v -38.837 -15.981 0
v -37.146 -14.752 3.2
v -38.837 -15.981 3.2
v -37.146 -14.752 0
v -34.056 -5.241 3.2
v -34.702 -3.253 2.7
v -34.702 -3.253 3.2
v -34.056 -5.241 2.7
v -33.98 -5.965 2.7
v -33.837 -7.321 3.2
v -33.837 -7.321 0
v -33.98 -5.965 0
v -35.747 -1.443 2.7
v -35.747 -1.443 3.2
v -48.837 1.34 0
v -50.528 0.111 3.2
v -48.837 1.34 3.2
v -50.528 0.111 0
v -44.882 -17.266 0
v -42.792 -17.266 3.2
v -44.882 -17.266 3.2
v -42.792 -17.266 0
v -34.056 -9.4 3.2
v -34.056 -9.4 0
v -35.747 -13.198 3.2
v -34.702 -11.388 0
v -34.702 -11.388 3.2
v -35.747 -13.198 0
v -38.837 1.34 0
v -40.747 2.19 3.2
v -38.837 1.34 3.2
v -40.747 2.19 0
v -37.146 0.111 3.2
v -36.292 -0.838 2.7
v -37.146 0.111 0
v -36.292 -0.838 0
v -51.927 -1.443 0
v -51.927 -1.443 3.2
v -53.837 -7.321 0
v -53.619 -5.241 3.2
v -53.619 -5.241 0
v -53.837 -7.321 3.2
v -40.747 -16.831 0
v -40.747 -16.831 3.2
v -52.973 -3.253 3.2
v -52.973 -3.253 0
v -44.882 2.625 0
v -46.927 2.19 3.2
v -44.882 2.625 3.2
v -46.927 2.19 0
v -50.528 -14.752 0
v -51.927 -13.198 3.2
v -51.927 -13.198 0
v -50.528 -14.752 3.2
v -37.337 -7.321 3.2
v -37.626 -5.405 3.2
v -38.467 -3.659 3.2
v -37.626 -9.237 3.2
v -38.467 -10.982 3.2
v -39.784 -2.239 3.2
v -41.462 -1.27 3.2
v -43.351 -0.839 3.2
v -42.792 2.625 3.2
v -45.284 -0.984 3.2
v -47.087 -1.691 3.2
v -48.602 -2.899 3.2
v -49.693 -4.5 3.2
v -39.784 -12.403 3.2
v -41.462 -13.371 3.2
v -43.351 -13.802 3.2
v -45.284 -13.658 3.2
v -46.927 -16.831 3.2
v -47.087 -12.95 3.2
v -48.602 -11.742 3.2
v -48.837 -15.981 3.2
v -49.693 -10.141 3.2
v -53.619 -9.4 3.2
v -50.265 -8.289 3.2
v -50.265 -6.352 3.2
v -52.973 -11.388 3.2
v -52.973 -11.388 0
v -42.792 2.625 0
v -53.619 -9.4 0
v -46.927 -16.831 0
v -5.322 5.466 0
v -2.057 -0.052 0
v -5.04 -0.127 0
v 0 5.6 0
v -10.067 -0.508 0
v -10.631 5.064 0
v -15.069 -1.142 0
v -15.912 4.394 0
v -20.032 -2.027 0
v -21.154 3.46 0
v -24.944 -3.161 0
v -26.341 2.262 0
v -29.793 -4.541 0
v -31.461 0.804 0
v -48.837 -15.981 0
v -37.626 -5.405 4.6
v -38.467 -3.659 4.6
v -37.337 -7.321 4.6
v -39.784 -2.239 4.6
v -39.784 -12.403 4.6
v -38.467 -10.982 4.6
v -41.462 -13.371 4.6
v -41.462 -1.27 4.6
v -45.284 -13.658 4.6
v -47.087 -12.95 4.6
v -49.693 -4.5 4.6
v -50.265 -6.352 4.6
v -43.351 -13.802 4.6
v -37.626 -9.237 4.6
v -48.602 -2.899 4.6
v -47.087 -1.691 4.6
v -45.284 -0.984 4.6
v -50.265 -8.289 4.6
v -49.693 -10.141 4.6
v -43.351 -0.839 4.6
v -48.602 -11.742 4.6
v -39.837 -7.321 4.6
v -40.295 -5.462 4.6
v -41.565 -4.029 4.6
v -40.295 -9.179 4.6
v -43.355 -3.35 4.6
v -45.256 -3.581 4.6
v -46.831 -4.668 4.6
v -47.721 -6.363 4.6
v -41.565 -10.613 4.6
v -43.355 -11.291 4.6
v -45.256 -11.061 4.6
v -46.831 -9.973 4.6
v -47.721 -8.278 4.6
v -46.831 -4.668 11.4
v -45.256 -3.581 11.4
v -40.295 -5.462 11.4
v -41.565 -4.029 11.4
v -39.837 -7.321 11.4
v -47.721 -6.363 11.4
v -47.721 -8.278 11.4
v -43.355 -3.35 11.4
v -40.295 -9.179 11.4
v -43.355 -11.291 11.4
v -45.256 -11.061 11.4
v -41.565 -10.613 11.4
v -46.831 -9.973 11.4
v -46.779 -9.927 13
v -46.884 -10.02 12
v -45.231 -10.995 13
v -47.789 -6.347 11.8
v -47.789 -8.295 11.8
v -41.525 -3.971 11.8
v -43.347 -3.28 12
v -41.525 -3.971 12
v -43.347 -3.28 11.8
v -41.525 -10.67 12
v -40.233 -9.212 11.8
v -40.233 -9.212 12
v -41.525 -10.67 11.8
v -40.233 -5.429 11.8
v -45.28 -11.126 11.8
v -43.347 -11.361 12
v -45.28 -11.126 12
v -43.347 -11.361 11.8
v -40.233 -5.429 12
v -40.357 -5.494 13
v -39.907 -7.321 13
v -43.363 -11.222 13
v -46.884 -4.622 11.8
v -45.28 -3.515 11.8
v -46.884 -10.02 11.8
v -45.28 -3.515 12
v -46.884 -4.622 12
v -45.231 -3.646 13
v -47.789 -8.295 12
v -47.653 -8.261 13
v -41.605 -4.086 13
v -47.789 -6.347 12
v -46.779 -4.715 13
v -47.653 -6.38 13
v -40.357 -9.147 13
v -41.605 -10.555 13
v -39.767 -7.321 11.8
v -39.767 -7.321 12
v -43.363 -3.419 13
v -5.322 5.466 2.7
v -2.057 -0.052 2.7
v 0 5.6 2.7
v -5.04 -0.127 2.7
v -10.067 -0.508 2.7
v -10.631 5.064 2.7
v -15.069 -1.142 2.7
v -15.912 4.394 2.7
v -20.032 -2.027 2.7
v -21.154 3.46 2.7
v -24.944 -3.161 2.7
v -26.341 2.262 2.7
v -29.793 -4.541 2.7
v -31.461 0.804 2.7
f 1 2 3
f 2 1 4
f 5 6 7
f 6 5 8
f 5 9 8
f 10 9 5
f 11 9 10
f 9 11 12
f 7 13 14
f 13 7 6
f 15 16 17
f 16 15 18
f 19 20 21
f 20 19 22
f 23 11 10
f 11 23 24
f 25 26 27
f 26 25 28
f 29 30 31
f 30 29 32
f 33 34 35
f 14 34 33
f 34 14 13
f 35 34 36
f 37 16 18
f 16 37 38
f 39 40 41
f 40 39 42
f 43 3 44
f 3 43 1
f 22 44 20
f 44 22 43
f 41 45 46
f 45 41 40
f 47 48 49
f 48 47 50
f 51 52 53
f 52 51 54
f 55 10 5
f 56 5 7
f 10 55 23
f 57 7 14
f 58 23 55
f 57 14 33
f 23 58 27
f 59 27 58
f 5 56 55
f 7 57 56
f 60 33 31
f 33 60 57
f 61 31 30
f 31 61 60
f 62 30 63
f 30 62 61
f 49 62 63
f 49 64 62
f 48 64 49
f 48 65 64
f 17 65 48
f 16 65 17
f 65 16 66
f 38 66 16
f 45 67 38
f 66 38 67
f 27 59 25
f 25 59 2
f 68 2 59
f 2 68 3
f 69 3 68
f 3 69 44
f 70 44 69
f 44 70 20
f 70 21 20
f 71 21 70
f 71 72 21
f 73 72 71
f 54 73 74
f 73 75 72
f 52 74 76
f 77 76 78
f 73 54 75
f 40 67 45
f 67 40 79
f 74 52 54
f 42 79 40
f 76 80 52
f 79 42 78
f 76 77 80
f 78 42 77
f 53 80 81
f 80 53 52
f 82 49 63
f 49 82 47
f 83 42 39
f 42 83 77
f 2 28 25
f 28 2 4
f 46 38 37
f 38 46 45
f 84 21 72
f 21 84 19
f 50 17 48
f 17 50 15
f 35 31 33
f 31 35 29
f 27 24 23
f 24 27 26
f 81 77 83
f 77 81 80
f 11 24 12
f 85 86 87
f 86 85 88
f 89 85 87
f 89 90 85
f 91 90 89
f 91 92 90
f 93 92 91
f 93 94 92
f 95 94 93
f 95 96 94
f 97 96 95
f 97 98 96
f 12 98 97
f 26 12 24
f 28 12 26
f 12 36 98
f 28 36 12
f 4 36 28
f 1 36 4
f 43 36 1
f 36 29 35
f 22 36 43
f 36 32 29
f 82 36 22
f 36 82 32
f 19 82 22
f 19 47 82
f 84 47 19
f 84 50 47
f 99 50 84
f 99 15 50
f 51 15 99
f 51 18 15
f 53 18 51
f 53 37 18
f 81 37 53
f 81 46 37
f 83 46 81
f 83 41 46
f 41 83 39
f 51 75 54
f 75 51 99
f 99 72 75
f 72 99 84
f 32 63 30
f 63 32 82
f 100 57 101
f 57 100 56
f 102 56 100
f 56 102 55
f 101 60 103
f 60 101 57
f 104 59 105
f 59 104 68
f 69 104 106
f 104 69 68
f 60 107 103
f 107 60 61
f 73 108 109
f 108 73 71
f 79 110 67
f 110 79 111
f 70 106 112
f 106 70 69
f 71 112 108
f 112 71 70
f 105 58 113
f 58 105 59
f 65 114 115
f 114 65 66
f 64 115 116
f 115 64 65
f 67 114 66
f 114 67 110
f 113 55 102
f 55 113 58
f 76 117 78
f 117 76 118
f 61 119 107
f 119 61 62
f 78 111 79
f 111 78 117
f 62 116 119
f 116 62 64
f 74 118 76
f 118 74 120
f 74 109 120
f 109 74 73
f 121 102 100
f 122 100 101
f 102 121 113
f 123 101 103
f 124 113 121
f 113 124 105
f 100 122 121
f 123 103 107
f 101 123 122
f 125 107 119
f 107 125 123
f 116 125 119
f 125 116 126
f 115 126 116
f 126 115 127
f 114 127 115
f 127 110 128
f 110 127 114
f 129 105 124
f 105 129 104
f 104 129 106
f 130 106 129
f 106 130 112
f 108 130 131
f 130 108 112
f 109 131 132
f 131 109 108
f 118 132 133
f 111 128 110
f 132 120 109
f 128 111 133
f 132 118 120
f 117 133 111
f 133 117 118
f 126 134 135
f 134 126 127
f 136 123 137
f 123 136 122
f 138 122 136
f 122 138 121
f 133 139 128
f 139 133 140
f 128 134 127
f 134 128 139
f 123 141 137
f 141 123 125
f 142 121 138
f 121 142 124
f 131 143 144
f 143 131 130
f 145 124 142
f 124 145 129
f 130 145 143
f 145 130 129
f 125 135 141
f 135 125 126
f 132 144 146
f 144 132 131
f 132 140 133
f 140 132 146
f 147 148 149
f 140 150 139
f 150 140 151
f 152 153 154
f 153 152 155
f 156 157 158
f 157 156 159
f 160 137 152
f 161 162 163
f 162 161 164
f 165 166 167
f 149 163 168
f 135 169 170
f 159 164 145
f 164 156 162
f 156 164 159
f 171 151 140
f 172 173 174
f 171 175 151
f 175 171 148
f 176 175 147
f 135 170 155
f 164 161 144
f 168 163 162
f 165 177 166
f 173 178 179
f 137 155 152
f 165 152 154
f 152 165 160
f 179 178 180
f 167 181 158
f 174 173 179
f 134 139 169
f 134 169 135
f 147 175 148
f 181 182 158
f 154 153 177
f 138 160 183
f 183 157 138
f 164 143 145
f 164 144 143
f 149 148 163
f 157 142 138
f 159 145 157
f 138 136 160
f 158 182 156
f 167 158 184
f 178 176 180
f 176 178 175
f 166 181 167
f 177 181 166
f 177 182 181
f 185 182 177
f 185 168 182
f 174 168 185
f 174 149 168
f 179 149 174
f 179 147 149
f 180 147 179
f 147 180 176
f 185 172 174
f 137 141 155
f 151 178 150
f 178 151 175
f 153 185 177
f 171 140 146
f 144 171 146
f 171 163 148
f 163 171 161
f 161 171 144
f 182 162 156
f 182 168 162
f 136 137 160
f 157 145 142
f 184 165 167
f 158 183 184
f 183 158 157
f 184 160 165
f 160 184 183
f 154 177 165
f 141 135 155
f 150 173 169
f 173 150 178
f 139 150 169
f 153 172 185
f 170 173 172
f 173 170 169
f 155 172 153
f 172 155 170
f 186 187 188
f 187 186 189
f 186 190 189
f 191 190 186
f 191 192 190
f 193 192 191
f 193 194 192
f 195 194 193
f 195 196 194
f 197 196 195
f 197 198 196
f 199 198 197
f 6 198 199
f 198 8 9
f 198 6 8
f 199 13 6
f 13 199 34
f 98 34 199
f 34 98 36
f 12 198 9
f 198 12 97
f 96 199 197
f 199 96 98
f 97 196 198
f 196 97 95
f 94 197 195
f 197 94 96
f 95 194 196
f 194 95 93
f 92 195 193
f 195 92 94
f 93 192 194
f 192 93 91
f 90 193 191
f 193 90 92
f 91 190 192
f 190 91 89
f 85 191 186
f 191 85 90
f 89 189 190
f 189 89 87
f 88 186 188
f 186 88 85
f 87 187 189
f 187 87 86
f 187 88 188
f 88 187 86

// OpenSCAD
/*
 * CR-10S Pro wheel guide for filament: bended arm with wheel support part
 *
 * History
 * -------
 * v01 (2021.06.21): Initial version
 */

// Rectangle window: 3x6 mm
depth  =  5.6;
height =  2.7; /* depending filament/printer take 2.6 */

angle = -26;    /* reduce number to get shorter arm */
distance = 100; /* increase number to get a more plane curbe */

function cumsum(values) =
  [ for (a=0, b=values[0]; a < len(values); a= a+1, b=b+values[a]) b];

module pilar() {
        round1_height = 3.2; d1=20;
        round2_height = 1.4; d2=13;
        round3_height = 6.8; d3=8;
        cylinder(h=round1_height, d=d1);
        translate([0, 0, round1_height])
            cylinder(h=round2_height, d=d2);
        translate([0, 0, round1_height + round2_height])
            cylinder(h=round3_height, d=d3);

        roundX_height = round1_height + round2_height + round3_height;
        h = [ 0.4, 0.2, 1.0 ]; z = cumsum(h);
        d3_offset = 0.14; /* 8.14 */
        hull() {
            translate([0, 0, roundX_height])
                cylinder(h=h[0], d=d3);
            translate([0, 0, roundX_height + z[0]])
                cylinder(h=h[1], d=d3+d3_offset);
            translate([0, 0, roundX_height + z[1]])
                cylinder(h=h[2], d1=d3, d2=d3-d3_offset);
        }
}

difference() {
    translate([0, -distance + depth/2, 0]) {
        union()  {
            /* curved arm */
            translate([0, -depth/2, 0])
                rotate([0,0, 90-angle])
                    rotate_extrude(angle=angle, convexity = 10, $fn=128)
                        translate([distance, 0, 0])
                            square([depth,height]);
            /* pilar */
            translate([distance * sin(angle), distance * cos(angle), 0])
                pilar();
        }
    }

    /* bevel cut */
    translate([0, depth, 0])
        rotate([0, 0, -20])
            translate([0, -2*depth, 0])
                cube([depth, 2*depth, height], center=false);
}
